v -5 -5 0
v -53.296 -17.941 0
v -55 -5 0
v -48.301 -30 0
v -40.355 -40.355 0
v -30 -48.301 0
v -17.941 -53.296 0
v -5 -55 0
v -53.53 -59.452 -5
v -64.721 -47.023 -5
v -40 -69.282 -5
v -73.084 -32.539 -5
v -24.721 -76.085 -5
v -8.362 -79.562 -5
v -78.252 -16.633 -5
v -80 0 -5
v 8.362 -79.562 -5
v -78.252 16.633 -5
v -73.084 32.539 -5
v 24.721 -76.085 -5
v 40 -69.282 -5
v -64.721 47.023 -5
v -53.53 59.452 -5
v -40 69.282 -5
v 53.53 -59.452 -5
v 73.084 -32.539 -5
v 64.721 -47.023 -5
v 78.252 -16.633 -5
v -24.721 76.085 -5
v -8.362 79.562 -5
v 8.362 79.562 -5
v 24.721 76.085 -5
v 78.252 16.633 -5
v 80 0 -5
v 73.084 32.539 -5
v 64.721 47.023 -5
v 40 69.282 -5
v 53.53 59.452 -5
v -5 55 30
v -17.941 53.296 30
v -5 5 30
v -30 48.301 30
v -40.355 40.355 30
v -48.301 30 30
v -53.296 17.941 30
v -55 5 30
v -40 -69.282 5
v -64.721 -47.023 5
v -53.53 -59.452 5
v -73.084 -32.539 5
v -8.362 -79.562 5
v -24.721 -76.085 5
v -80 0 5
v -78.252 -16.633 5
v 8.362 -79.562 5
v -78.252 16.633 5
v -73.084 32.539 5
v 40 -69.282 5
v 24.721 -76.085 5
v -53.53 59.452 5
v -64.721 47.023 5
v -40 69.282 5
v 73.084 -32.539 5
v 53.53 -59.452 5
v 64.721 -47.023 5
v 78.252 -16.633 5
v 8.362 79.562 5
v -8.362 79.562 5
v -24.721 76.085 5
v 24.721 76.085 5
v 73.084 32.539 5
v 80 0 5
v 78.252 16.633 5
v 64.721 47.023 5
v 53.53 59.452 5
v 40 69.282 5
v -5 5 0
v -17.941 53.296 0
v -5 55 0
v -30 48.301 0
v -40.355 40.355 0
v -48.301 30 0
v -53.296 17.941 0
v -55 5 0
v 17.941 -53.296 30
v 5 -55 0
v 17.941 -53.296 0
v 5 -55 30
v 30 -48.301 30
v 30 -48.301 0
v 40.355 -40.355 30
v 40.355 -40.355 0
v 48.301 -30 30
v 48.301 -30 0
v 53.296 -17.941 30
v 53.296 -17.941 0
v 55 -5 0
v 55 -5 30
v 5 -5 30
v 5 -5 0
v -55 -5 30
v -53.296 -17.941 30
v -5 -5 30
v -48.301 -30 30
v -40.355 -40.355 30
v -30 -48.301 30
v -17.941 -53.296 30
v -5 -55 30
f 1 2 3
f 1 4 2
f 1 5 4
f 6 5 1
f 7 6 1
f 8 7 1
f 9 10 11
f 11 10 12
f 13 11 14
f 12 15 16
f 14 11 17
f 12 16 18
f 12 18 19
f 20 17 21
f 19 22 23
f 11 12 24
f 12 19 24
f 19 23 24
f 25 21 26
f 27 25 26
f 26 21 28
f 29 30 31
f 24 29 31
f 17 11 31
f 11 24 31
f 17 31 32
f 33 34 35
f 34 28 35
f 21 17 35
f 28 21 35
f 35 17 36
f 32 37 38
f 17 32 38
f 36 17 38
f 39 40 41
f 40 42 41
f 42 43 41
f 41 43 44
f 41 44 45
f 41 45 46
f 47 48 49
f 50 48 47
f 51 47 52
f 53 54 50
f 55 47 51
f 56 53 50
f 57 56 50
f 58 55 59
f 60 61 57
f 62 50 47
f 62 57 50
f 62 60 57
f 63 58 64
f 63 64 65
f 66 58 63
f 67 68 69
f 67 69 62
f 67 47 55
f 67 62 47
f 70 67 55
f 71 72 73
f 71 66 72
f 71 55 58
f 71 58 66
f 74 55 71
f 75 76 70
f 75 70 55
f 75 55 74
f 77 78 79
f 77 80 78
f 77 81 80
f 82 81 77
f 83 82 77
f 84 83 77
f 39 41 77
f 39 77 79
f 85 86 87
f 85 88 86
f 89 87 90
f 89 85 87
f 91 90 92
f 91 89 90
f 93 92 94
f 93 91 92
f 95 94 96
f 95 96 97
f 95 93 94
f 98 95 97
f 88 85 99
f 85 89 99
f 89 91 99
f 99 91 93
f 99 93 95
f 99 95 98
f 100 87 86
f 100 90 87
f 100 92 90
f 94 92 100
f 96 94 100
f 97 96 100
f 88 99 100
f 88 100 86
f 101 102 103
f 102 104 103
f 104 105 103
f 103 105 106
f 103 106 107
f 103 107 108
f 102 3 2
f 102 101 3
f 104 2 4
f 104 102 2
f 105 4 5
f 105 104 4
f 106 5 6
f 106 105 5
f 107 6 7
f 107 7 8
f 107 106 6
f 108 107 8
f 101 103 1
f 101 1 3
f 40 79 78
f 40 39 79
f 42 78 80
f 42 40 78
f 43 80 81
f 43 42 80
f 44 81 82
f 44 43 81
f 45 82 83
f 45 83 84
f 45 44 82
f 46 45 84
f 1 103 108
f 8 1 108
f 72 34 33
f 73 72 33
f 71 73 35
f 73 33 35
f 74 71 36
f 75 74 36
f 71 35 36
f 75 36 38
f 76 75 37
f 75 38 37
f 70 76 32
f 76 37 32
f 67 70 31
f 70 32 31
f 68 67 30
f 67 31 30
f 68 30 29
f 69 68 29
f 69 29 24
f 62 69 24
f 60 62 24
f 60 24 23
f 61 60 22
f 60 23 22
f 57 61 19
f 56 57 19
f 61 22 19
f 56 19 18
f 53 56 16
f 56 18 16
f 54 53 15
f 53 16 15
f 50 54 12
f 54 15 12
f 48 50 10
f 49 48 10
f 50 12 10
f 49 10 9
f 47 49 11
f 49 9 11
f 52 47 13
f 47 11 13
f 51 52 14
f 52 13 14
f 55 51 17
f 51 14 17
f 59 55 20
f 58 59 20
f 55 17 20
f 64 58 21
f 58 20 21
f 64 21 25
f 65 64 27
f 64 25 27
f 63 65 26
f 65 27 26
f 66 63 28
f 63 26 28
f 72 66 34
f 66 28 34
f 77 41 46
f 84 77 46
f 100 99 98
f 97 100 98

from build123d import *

# Parameters (mm, degrees)
CYLINDER_R        = 80
CYLINDER_DEPTH    = 10
CYLINDER001_W     = 50
CYLINDER001_H     = 30
CYLINDER001_ANGLE = 90
CYLINDER002_W     = 50
CYLINDER002_H     = 30
CYLINDER002_ANGLE = 90
CYLINDER003_W     = 50
CYLINDER003_H     = 30
CYLINDER003_ANGLE = 90


with BuildPart() as plato:
    # Cylinder → Cylinder (new body)
    with BuildSketch(Plane.XY.offset(-5)):
        Circle(CYLINDER_R)
    extrude(amount=CYLINDER_DEPTH)


with BuildPart() as trozo1:
    # Cylinder001 → Cylinder001 (revolve)
    with BuildSketch(Plane(origin=(-5, 5, 0), x_dir=(0, 1, 0), z_dir=(1, 0, 0))):
        with Locations((25, 15)):
            Rectangle(CYLINDER001_W, CYLINDER001_H)
    revolve(axis=Axis((-5, 5, 0), (0, 0, 1)), revolution_arc=CYLINDER001_ANGLE)


with BuildPart() as trozo2:
    # Cylinder002 → Cylinder002 (revolve)
    with BuildSketch(Plane(origin=(-5, -5, 0), x_dir=(-1, 0, 0), z_dir=(0, 1, 0))):
        with Locations((25, 15)):
            Rectangle(CYLINDER002_W, CYLINDER002_H)
    revolve(axis=Axis((-5, -5, 0), (0, 0, 1)), revolution_arc=CYLINDER002_ANGLE)


with BuildPart() as trozo3:
    # Cylinder003 → Cylinder003 (revolve)
    with BuildSketch(Plane(origin=(5, -5, 0), x_dir=(0, -1, 0), z_dir=(-1, 0, 0))):
        with Locations((25, 15)):
            Rectangle(CYLINDER003_W, CYLINDER003_H)
    revolve(axis=Axis((5, -5, 0), (0, 0, 1)), revolution_arc=CYLINDER003_ANGLE)


solid = Compound([plato.part, trozo1.part, trozo2.part, trozo3.part])
